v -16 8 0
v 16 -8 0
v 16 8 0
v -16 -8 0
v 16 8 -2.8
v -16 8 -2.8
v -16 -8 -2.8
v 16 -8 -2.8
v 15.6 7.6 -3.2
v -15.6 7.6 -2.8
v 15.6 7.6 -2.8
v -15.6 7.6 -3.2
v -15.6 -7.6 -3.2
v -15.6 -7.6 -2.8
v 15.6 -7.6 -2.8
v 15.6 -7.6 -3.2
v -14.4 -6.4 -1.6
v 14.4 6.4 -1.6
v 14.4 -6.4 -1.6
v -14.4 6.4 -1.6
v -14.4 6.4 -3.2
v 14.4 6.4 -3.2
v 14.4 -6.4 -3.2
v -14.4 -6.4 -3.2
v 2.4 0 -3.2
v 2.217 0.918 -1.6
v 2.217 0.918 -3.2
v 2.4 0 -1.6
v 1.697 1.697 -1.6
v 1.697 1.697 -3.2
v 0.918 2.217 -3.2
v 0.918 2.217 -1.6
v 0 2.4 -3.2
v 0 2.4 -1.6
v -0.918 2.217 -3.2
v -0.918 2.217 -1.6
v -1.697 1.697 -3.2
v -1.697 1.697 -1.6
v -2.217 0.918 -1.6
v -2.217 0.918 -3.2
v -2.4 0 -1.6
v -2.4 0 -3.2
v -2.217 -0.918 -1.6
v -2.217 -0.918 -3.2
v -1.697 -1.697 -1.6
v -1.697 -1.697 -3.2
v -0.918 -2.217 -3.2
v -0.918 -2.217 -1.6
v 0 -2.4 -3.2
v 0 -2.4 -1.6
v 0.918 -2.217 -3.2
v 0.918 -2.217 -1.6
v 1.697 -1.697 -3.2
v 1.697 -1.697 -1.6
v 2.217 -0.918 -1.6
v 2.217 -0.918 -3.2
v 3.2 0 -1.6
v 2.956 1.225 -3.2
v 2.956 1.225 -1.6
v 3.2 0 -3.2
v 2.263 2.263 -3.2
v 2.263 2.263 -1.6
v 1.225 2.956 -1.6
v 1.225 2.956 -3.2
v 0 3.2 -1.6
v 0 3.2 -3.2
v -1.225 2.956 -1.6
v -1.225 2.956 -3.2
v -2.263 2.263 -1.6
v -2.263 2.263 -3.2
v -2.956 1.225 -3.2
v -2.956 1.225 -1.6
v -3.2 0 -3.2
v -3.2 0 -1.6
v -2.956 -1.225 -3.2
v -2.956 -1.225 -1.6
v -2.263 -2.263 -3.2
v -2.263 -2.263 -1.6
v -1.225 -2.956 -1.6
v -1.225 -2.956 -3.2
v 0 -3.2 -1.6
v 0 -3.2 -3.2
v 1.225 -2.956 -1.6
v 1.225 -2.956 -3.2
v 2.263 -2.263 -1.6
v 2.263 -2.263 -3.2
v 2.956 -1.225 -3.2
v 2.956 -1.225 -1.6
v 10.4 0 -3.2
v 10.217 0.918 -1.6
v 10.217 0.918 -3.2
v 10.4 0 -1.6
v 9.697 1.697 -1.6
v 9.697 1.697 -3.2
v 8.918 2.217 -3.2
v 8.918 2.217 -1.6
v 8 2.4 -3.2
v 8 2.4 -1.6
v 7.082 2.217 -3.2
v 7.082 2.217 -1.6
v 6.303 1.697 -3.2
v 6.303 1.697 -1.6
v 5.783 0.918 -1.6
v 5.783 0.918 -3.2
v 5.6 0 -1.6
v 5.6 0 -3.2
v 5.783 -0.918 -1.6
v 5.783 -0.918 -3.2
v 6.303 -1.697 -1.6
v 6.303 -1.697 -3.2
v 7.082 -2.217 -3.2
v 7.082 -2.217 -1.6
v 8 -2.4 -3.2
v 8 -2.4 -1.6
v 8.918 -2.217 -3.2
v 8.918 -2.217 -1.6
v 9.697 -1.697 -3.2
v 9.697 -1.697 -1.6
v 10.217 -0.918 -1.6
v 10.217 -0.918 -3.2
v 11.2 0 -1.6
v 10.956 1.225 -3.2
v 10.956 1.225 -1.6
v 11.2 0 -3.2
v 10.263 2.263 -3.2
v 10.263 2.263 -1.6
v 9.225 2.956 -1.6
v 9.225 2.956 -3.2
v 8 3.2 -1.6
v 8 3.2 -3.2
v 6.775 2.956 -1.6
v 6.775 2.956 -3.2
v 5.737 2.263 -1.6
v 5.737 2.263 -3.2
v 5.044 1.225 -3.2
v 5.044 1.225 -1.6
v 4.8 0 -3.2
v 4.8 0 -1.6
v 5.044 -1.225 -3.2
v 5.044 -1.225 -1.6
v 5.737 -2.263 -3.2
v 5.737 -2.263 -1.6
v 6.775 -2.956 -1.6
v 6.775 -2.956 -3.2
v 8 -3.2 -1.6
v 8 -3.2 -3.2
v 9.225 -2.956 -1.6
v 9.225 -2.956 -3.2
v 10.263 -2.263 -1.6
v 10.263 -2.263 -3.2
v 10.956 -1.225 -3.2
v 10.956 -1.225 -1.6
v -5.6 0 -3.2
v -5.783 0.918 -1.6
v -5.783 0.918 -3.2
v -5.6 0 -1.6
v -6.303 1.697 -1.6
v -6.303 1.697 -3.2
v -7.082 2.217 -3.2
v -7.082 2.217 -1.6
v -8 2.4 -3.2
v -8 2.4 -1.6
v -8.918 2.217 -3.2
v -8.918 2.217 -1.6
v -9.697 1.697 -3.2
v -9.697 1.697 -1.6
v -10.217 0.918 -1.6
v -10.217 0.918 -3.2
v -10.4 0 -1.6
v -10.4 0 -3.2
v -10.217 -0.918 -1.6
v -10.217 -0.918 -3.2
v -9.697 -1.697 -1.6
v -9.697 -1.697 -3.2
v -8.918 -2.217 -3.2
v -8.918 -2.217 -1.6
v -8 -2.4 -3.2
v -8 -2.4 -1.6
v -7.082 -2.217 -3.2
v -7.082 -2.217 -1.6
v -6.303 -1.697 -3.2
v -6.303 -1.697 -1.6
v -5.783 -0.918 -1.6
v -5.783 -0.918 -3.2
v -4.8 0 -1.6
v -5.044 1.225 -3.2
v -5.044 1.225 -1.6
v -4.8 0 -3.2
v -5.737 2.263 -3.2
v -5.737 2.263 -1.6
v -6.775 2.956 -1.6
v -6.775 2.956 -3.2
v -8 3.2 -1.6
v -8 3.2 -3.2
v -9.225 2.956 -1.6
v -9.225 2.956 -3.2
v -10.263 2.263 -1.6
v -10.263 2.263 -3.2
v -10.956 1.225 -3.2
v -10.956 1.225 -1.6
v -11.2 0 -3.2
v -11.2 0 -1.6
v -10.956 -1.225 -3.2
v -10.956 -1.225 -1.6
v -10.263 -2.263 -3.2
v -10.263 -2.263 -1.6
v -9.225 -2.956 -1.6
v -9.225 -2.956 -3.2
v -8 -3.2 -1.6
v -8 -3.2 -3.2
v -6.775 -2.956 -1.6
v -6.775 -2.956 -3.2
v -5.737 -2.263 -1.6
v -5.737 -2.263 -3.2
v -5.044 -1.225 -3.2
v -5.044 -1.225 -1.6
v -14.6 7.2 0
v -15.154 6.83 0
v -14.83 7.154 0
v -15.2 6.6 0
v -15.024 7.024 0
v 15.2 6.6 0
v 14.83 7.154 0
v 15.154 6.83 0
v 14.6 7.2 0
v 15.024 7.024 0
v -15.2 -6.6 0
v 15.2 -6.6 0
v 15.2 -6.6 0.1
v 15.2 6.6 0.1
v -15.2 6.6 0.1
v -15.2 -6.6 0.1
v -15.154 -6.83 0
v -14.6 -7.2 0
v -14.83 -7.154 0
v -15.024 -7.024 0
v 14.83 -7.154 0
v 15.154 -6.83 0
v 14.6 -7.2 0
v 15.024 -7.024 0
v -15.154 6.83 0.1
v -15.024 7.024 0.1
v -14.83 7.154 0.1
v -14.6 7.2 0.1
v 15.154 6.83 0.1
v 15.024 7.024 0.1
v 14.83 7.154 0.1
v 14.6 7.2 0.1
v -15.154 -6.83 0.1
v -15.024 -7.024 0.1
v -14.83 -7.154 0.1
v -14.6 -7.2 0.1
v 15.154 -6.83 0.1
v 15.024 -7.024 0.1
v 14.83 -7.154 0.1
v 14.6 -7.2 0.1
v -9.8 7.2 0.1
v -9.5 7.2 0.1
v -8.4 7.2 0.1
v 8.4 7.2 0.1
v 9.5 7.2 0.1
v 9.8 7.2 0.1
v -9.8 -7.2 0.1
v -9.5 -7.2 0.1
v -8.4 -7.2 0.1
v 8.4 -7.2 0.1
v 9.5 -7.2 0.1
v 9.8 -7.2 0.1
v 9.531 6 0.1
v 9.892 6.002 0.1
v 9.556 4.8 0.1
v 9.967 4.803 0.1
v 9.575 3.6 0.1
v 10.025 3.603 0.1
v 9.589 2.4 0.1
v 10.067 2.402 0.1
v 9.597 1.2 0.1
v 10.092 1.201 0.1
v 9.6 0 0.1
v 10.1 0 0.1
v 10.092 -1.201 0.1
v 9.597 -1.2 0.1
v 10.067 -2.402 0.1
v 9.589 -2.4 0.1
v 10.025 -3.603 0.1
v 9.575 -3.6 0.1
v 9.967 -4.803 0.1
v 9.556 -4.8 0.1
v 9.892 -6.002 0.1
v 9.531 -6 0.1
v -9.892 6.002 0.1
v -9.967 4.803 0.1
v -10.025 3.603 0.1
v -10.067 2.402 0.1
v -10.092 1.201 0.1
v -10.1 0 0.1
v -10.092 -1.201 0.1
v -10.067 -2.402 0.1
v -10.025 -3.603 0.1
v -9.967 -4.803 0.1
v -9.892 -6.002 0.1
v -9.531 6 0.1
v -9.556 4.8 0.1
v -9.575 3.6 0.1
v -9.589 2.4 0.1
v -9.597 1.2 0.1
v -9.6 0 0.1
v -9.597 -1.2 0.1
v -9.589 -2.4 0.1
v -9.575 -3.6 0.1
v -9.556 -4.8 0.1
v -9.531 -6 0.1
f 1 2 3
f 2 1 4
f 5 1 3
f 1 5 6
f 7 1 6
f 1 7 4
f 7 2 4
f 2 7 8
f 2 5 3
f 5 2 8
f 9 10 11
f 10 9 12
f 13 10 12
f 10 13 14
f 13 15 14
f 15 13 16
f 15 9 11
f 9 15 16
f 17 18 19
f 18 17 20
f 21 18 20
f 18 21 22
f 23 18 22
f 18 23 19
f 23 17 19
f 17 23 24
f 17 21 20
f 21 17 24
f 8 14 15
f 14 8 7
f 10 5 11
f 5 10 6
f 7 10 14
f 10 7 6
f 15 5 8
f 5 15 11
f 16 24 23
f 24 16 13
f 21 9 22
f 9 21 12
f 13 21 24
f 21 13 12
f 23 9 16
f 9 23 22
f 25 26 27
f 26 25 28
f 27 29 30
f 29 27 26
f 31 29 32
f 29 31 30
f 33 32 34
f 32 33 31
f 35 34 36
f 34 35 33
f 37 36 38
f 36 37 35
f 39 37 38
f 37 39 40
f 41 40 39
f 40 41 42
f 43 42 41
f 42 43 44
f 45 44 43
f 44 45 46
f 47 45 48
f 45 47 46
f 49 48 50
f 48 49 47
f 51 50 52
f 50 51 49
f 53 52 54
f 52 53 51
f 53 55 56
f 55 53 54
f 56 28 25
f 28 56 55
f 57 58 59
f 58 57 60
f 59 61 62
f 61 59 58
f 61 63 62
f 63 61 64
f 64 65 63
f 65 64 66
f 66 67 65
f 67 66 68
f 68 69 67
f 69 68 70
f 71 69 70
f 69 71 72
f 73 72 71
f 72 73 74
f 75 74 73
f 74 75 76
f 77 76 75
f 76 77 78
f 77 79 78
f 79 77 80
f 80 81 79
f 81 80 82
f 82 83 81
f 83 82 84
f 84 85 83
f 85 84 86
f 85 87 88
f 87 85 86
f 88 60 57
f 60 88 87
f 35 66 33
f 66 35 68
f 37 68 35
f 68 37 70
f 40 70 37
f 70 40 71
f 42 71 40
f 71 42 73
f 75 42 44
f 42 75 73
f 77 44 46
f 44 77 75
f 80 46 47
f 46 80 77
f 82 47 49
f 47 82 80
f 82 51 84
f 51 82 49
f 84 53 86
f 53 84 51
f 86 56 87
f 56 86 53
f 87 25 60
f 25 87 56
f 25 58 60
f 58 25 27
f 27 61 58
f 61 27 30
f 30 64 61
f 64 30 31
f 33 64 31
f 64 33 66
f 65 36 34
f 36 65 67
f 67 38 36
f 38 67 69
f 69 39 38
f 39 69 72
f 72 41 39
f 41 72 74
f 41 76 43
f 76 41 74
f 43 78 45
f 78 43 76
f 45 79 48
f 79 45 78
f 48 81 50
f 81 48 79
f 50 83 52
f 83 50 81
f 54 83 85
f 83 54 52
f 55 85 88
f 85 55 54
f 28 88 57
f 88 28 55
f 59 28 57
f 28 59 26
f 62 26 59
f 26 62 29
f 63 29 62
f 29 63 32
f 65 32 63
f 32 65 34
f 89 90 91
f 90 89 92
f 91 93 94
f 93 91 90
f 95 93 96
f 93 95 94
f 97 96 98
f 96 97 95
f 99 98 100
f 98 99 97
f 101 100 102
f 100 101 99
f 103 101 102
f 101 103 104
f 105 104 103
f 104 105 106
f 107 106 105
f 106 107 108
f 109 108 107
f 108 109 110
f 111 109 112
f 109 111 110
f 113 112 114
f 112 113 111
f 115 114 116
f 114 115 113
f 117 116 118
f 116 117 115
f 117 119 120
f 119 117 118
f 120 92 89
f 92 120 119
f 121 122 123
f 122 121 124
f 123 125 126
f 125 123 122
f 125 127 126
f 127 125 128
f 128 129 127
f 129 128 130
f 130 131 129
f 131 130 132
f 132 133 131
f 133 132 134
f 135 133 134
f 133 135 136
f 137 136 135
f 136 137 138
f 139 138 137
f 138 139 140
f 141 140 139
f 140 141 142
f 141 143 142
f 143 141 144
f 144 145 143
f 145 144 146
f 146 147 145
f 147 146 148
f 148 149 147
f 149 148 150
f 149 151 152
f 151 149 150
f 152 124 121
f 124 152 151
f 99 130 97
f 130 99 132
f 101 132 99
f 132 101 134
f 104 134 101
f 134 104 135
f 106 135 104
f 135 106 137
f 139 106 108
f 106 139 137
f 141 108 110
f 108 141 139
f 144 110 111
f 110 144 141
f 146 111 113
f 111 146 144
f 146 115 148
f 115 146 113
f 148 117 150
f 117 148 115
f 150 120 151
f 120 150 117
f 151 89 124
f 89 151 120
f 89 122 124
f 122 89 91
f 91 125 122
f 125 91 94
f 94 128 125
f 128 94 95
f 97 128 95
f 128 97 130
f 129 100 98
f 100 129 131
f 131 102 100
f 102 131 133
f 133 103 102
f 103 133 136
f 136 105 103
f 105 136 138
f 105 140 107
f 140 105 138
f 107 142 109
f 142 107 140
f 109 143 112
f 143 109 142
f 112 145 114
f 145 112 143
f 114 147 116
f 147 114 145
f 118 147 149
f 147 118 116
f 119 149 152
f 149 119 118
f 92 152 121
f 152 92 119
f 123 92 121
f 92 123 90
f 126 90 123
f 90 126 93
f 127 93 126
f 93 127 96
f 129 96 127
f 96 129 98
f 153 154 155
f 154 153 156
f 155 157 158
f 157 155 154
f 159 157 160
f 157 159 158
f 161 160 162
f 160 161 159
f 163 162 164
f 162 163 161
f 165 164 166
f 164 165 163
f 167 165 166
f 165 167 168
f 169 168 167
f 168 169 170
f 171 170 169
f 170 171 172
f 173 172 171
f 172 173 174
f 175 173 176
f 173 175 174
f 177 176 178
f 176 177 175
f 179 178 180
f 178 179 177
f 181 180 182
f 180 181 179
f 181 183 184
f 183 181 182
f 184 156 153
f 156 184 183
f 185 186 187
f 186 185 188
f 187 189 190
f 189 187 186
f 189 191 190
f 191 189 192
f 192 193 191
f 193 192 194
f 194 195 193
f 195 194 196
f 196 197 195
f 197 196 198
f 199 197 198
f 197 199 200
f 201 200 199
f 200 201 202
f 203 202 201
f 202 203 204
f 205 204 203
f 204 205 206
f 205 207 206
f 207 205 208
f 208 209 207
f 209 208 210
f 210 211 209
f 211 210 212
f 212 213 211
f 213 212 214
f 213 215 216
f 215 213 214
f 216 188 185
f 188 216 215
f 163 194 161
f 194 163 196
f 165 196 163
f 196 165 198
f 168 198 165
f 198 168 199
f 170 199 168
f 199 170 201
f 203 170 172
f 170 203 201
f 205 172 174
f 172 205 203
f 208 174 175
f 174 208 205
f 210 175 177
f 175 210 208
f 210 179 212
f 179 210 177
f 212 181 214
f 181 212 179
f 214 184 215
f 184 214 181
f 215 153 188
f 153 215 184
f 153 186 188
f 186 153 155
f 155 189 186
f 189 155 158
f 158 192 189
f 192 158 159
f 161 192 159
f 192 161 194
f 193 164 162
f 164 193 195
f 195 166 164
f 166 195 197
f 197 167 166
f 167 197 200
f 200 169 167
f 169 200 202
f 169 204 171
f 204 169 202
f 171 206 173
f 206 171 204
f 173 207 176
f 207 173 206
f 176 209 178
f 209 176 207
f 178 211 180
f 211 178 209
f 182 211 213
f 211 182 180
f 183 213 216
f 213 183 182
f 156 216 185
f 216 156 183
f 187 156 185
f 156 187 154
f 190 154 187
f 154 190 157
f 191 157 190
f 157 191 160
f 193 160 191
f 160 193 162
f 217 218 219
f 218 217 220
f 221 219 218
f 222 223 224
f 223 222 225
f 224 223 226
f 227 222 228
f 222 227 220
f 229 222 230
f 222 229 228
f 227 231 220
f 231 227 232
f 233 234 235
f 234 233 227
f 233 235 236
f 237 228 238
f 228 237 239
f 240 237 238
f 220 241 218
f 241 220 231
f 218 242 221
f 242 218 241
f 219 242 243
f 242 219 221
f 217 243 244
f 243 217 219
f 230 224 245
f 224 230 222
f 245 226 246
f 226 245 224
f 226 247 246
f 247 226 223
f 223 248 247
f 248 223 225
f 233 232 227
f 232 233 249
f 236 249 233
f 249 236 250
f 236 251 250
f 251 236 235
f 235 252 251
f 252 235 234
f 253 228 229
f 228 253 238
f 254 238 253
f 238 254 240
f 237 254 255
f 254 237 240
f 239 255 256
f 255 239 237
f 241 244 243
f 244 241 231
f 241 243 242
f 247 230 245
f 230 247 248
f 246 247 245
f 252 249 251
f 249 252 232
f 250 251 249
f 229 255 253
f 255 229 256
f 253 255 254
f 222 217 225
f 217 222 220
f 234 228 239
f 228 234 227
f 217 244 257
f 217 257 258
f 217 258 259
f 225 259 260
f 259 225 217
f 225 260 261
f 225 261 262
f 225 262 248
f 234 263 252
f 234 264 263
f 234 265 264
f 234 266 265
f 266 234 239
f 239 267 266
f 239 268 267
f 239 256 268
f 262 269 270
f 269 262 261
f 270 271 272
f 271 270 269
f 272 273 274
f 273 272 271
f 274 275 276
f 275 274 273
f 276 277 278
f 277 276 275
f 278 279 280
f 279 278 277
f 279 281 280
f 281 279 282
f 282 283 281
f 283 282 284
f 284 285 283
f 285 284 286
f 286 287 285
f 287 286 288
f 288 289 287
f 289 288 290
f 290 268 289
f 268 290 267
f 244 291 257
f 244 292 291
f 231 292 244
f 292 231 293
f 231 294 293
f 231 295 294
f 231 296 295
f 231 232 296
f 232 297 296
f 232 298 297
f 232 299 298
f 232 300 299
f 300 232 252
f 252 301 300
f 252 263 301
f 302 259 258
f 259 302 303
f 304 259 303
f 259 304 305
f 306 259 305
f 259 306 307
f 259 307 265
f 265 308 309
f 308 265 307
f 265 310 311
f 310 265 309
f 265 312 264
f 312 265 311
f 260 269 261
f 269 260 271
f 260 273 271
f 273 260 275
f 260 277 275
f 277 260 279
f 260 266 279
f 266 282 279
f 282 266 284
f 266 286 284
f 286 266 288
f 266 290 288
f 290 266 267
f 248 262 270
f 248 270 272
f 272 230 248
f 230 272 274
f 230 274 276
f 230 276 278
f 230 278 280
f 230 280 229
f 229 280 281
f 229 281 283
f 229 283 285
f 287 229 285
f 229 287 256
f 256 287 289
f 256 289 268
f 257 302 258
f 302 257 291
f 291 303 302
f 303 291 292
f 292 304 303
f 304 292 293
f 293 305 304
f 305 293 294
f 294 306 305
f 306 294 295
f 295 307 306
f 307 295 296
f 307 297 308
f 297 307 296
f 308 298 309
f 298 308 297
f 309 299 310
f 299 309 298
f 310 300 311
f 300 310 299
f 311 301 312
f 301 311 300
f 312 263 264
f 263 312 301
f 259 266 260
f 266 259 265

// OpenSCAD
// file: ../p/4-4ring3.scad
use <../lib.scad>
$fa=1; $fs=0.2;
function ldraw_lib__4_4ring3(realsolid=false) = [
// 0 Ring  3 x 1.0
// 0 Name: 4-4ring3.dat
// 0 Author: James Jessiman
// 0 !LDRAW_ORG Primitive UPDATE 2009-01
// 0 !LICENSE Licensed under CC BY 2.0 and CC BY 4.0 : see CAreadme.txt
// 
// 0 BFC CERTIFY CCW
  [0,"BFC","CERTIFY"],
  [0,"BFC","CCW"],
// 
// 0 !HISTORY 1998-12-15 [PTadmin] Official Update 1998-10
// 0 !HISTORY 2002-04-05 [hafhead] Added BFC statement
// 0 !HISTORY 2002-04-25 [PTadmin] Official Update 2002-02
// 0 !HISTORY 2007-06-24 [PTadmin] Header formatted for Contributor Agreement
// 0 !HISTORY 2008-07-01 [PTadmin] Official Update 2008-01
// 0 !HISTORY 2008-08-26 [cwdee] Switch polygon winding and rename
// 0 !HISTORY 2009-05-02 [PTadmin] Official Update 2009-01
// 
// 
// 4 16 -1.5308 0 3.6956 -1.1481 0 2.7717 0 0 3 0 0 4
  [4,16,-1.5308,0,3.6956,-1.1481,0,2.7717,0,0,3,0,0,4],
// 4 16 -2.8284 0 2.8284 -2.1213 0 2.1213 -1.1481 0 2.7717 -1.5308 0 3.6956
  [4,16,-2.8284,0,2.8284,-2.1213,0,2.1213,-1.1481,0,2.7717,-1.5308,0,3.6956],
// 4 16 -3.6956 0 1.5308 -2.7717 0 1.1481 -2.1213 0 2.1213 -2.8284 0 2.8284
  [4,16,-3.6956,0,1.5308,-2.7717,0,1.1481,-2.1213,0,2.1213,-2.8284,0,2.8284],
// 4 16 -4 0 0 -3 0 0 -2.7717 0 1.1481 -3.6956 0 1.5308
  [4,16,-4,0,0,-3,0,0,-2.7717,0,1.1481,-3.6956,0,1.5308],
// 4 16 -3.6956 0 -1.5308 -2.7717 0 -1.1481 -3 0 0 -4 0 0
  [4,16,-3.6956,0,-1.5308,-2.7717,0,-1.1481,-3,0,0,-4,0,0],
// 4 16 -2.8284 0 -2.8284 -2.1213 0 -2.1213 -2.7717 0 -1.1481 -3.6956 0 -1.5308
  [4,16,-2.8284,0,-2.8284,-2.1213,0,-2.1213,-2.7717,0,-1.1481,-3.6956,0,-1.5308],
// 4 16 -1.5308 0 -3.6956 -1.1481 0 -2.7717 -2.1213 0 -2.1213 -2.8284 0 -2.8284
  [4,16,-1.5308,0,-3.6956,-1.1481,0,-2.7717,-2.1213,0,-2.1213,-2.8284,0,-2.8284],
// 4 16 0 0 -4 0 0 -3 -1.1481 0 -2.7717 -1.5308 0 -3.6956
  [4,16,0,0,-4,0,0,-3,-1.1481,0,-2.7717,-1.5308,0,-3.6956],
// 4 16 1.5308 0 -3.6956 1.1481 0 -2.7717 0 0 -3 0 0 -4
  [4,16,1.5308,0,-3.6956,1.1481,0,-2.7717,0,0,-3,0,0,-4],
// 4 16 2.8284 0 -2.8284 2.1213 0 -2.1213 1.1481 0 -2.7717 1.5308 0 -3.6956
  [4,16,2.8284,0,-2.8284,2.1213,0,-2.1213,1.1481,0,-2.7717,1.5308,0,-3.6956],
// 4 16 3.6956 0 -1.5308 2.7717 0 -1.1481 2.1213 0 -2.1213 2.8284 0 -2.8284
  [4,16,3.6956,0,-1.5308,2.7717,0,-1.1481,2.1213,0,-2.1213,2.8284,0,-2.8284],
// 4 16 4 0 0 3 0 0 2.7717 0 -1.1481 3.6956 0 -1.5308
  [4,16,4,0,0,3,0,0,2.7717,0,-1.1481,3.6956,0,-1.5308],
// 4 16 3.6956 0 1.5308 2.7717 0 1.1481 3 0 0 4 0 0
  [4,16,3.6956,0,1.5308,2.7717,0,1.1481,3,0,0,4,0,0],
// 4 16 2.8284 0 2.8284 2.1213 0 2.1213 2.7717 0 1.1481 3.6956 0 1.5308
  [4,16,2.8284,0,2.8284,2.1213,0,2.1213,2.7717,0,1.1481,3.6956,0,1.5308],
// 4 16 1.5308 0 3.6956 1.1481 0 2.7717 2.1213 0 2.1213 2.8284 0 2.8284
  [4,16,1.5308,0,3.6956,1.1481,0,2.7717,2.1213,0,2.1213,2.8284,0,2.8284],
// 4 16 0 0 4 0 0 3 1.1481 0 2.7717 1.5308 0 3.6956
  [4,16,0,0,4,0,0,3,1.1481,0,2.7717,1.5308,0,3.6956],
// 0
];
module ldraw_lib__4_4ring3(step=0, col=false, unit=2/5, alt=false, line=0.2, solid=!$preview)
    makepoly(ldraw_lib__4_4ring3(solid), step=step, col=col, unit=unit, alt=alt, line=line, solid=solid);
ldraw_lib__4_4ring3(line=0.2);
// file: ../p/4-4edge.scad
use <../lib.scad>
function ldraw_lib__4_4edge() = [
// 0 Circle 1.0
// 0 Name: 4-4edge.dat
// 0 Author: James Jessiman
// 0 !LDRAW_ORG Primitive UPDATE 2017-01
// 0 !LICENSE Licensed under CC BY 2.0 and CC BY 4.0 : see CAreadme.txt
// 
// 0 BFC CERTIFY CCW
  [0,"BFC","CERTIFY"],
  [0,"BFC","CCW"],
// 
// 0 !HISTORY 1998-12-15 [PTadmin] Official Update 1998-10
// 0 !HISTORY 2005-12-28 [PTadmin] Official Update 2005-01
// 0 !HISTORY 2007-06-24 [PTadmin] Header formatted for Contributor Agreement
// 0 !HISTORY 2008-07-01 [PTadmin] Official Update 2008-01
// 0 !HISTORY 2017-01-15 [Steffen] BFCed
// 0 !HISTORY 2017-12-30 [PTadmin] Official Update 2017-01
// 
// 
// 2 24 1 0 0 0.9239 0 0.3827
  [2,24,1,0,0,0.9239,0,0.3827],
// 2 24 0.9239 0 0.3827 0.7071 0 0.7071
  [2,24,0.9239,0,0.3827,0.7071,0,0.7071],
// 2 24 0.7071 0 0.7071 0.3827 0 0.9239
  [2,24,0.7071,0,0.7071,0.3827,0,0.9239],
// 2 24 0.3827 0 0.9239 0 0 1
  [2,24,0.3827,0,0.9239,0,0,1],
// 2 24 0 0 1 -0.3827 0 0.9239
  [2,24,0,0,1,-0.3827,0,0.9239],
// 2 24 -0.3827 0 0.9239 -0.7071 0 0.7071
  [2,24,-0.3827,0,0.9239,-0.7071,0,0.7071],
// 2 24 -0.7071 0 0.7071 -0.9239 0 0.3827
  [2,24,-0.7071,0,0.7071,-0.9239,0,0.3827],
// 2 24 -0.9239 0 0.3827 -1 0 -0
  [2,24,-0.9239,0,0.3827,-1,0,-0],
// 2 24 -1 0 -0 -0.9239 0 -0.3827
  [2,24,-1,0,-0,-0.9239,0,-0.3827],
// 2 24 -0.9239 0 -0.3827 -0.7071 0 -0.7071
  [2,24,-0.9239,0,-0.3827,-0.7071,0,-0.7071],
// 2 24 -0.7071 0 -0.7071 -0.3827 0 -0.9239
  [2,24,-0.7071,0,-0.7071,-0.3827,0,-0.9239],
// 2 24 -0.3827 0 -0.9239 0 0 -1
  [2,24,-0.3827,0,-0.9239,0,0,-1],
// 2 24 0 0 -1 0.3827 0 -0.9239
  [2,24,0,0,-1,0.3827,0,-0.9239],
// 2 24 0.3827 0 -0.9239 0.7071 0 -0.7071
  [2,24,0.3827,0,-0.9239,0.7071,0,-0.7071],
// 2 24 0.7071 0 -0.7071 0.9239 0 -0.3827
  [2,24,0.7071,0,-0.7071,0.9239,0,-0.3827],
// 2 24 0.9239 0 -0.3827 1 0 0
  [2,24,0.9239,0,-0.3827,1,0,0],
];
module ldraw_lib__4_4edge(step=0, col=false, unit=2/5, alt=false, line=0.2, solid=!$preview)
    makepoly(ldraw_lib__4_4edge(), step=step, col=col, unit=unit, alt=alt, line=line, solid=solid);
ldraw_lib__4_4edge(line=0.2);
// file: ../p/4-4cyli.scad
use <../lib.scad>
$fa=1; $fs=0.2;
function ldraw_lib__4_4cyli(realsolid=false) = [
// 0 Cylinder 1.0
// 0 Name: 4-4cyli.dat
// 0 Author: James Jessiman
// 0 !LDRAW_ORG Primitive UPDATE 2005-01
// 0 !LICENSE Licensed under CC BY 2.0 and CC BY 4.0 : see CAreadme.txt
// 
// 0 BFC CERTIFY CCW
  [0,"BFC","CERTIFY"],
  [0,"BFC","CCW"],
// 
// 0 !HISTORY 1998-12-15 [PTadmin] Official Update 1998-10
// 0 !HISTORY 2002-03-23 [sbliss] Added BFC statement; merged headers from files in distributions LDraw 0.27 and Complete.
// 0 !HISTORY 2002-04-25 [PTadmin] Official Update 2002-02
// 0 !HISTORY 2004-12-14 [guyvivan] BFC CCW
// 0 !HISTORY 2005-12-28 [PTadmin] Official Update 2005-01
// 0 !HISTORY 2007-06-24 [PTadmin] Header formatted for Contributor Agreement
// 0 !HISTORY 2008-07-01 [PTadmin] Official Update 2008-01
// 
// 
// 4 16 1 1 0 0.9239 1 0.3827 0.9239 0 0.3827 1 0 0
  [4,16,1,1,0,0.9239,1,0.3827,0.9239,0,0.3827,1,0,0],
// 5 24 1 0 0 1 1 0 0.9239 0 0.3827 0.9239 0 -0.3827
  [5,24,1,0,0,1,1,0,0.9239,0,0.3827,0.9239,0,-0.3827],
// 4 16 0.9239 1 0.3827 0.7071 1 0.7071 0.7071 0 0.7071 0.9239 0 0.3827
  [4,16,0.9239,1,0.3827,0.7071,1,0.7071,0.7071,0,0.7071,0.9239,0,0.3827],
// 5 24 0.9239 0 0.3827 0.9239 1 0.3827 0.7071 0 0.7071 1 0 0
  [5,24,0.9239,0,0.3827,0.9239,1,0.3827,0.7071,0,0.7071,1,0,0],
// 4 16 0.7071 1 0.7071 0.3827 1 0.9239 0.3827 0 0.9239 0.7071 0 0.7071
  [4,16,0.7071,1,0.7071,0.3827,1,0.9239,0.3827,0,0.9239,0.7071,0,0.7071],
// 5 24 0.7071 0 0.7071 0.7071 1 0.7071 0.3827 0 0.9239 0.9239 0 0.3827
  [5,24,0.7071,0,0.7071,0.7071,1,0.7071,0.3827,0,0.9239,0.9239,0,0.3827],
// 4 16 0.3827 1 0.9239 0 1 1 0 0 1 0.3827 0 0.9239
  [4,16,0.3827,1,0.9239,0,1,1,0,0,1,0.3827,0,0.9239],
// 5 24 0.3827 0 0.9239 0.3827 1 0.9239 0 0 1 0.7071 0 0.7071
  [5,24,0.3827,0,0.9239,0.3827,1,0.9239,0,0,1,0.7071,0,0.7071],
// 4 16 0 1 1 -0.3827 1 0.9239 -0.3827 0 0.9239 0 0 1
  [4,16,0,1,1,-0.3827,1,0.9239,-0.3827,0,0.9239,0,0,1],
// 5 24 0 0 1 0 1 1 -0.3827 0 0.9239 0.3827 0 0.9239
  [5,24,0,0,1,0,1,1,-0.3827,0,0.9239,0.3827,0,0.9239],
// 4 16 -0.3827 1 0.9239 -0.7071 1 0.7071 -0.7071 0 0.7071 -0.3827 0 0.9239
  [4,16,-0.3827,1,0.9239,-0.7071,1,0.7071,-0.7071,0,0.7071,-0.3827,0,0.9239],
// 5 24 -0.3827 0 0.9239 -0.3827 1 0.9239 -0.7071 0 0.7071 0 0 1
  [5,24,-0.3827,0,0.9239,-0.3827,1,0.9239,-0.7071,0,0.7071,0,0,1],
// 4 16 -0.7071 1 0.7071 -0.9239 1 0.3827 -0.9239 0 0.3827 -0.7071 0 0.7071
  [4,16,-0.7071,1,0.7071,-0.9239,1,0.3827,-0.9239,0,0.3827,-0.7071,0,0.7071],
// 5 24 -0.7071 0 0.7071 -0.7071 1 0.7071 -0.9239 0 0.3827 -0.3827 0 0.9239
  [5,24,-0.7071,0,0.7071,-0.7071,1,0.7071,-0.9239,0,0.3827,-0.3827,0,0.9239],
// 4 16 -0.9239 1 0.3827 -1 1 0 -1 0 0 -0.9239 0 0.3827
  [4,16,-0.9239,1,0.3827,-1,1,0,-1,0,0,-0.9239,0,0.3827],
// 5 24 -0.9239 0 0.3827 -0.9239 1 0.3827 -1 0 0 -0.7071 0 0.7071
  [5,24,-0.9239,0,0.3827,-0.9239,1,0.3827,-1,0,0,-0.7071,0,0.7071],
// 4 16 -1 1 0 -0.9239 1 -0.3827 -0.9239 0 -0.3827 -1 0 0
  [4,16,-1,1,0,-0.9239,1,-0.3827,-0.9239,0,-0.3827,-1,0,0],
// 5 24 -1 0 0 -1 1 0 -0.9239 0 -0.3827 -0.9239 0 0.3827
  [5,24,-1,0,0,-1,1,0,-0.9239,0,-0.3827,-0.9239,0,0.3827],
// 4 16 -0.9239 1 -0.3827 -0.7071 1 -0.7071 -0.7071 0 -0.7071 -0.9239 0 -0.3827
  [4,16,-0.9239,1,-0.3827,-0.7071,1,-0.7071,-0.7071,0,-0.7071,-0.9239,0,-0.3827],
// 5 24 -0.9239 0 -0.3827 -0.9239 1 -0.3827 -0.7071 0 -0.7071 -1 0 0
  [5,24,-0.9239,0,-0.3827,-0.9239,1,-0.3827,-0.7071,0,-0.7071,-1,0,0],
// 4 16 -0.7071 1 -0.7071 -0.3827 1 -0.9239 -0.3827 0 -0.9239 -0.7071 0 -0.7071
  [4,16,-0.7071,1,-0.7071,-0.3827,1,-0.9239,-0.3827,0,-0.9239,-0.7071,0,-0.7071],
// 5 24 -0.7071 0 -0.7071 -0.7071 1 -0.7071 -0.3827 0 -0.9239 -0.9239 0 -0.3827
  [5,24,-0.7071,0,-0.7071,-0.7071,1,-0.7071,-0.3827,0,-0.9239,-0.9239,0,-0.3827],
// 4 16 -0.3827 1 -0.9239 0 1 -1 0 0 -1 -0.3827 0 -0.9239
  [4,16,-0.3827,1,-0.9239,0,1,-1,0,0,-1,-0.3827,0,-0.9239],
// 5 24 -0.3827 0 -0.9239 -0.3827 1 -0.9239 0 0 -1 -0.7071 0 -0.7071
  [5,24,-0.3827,0,-0.9239,-0.3827,1,-0.9239,0,0,-1,-0.7071,0,-0.7071],
// 4 16 0 1 -1 0.3827 1 -0.9239 0.3827 0 -0.9239 0 0 -1
  [4,16,0,1,-1,0.3827,1,-0.9239,0.3827,0,-0.9239,0,0,-1],
// 5 24 0 0 -1 0 1 -1 0.3827 0 -0.9239 -0.3827 0 -0.9239
  [5,24,0,0,-1,0,1,-1,0.3827,0,-0.9239,-0.3827,0,-0.9239],
// 4 16 0.3827 1 -0.9239 0.7071 1 -0.7071 0.7071 0 -0.7071 0.3827 0 -0.9239
  [4,16,0.3827,1,-0.9239,0.7071,1,-0.7071,0.7071,0,-0.7071,0.3827,0,-0.9239],
// 5 24 0.3827 0 -0.9239 0.3827 1 -0.9239 0.7071 0 -0.7071 0 0 -1
  [5,24,0.3827,0,-0.9239,0.3827,1,-0.9239,0.7071,0,-0.7071,0,0,-1],
// 4 16 0.7071 1 -0.7071 0.9239 1 -0.3827 0.9239 0 -0.3827 0.7071 0 -0.7071
  [4,16,0.7071,1,-0.7071,0.9239,1,-0.3827,0.9239,0,-0.3827,0.7071,0,-0.7071],
// 5 24 0.7071 0 -0.7071 0.7071 1 -0.7071 0.9239 0 -0.3827 0.3827 0 -0.9239
  [5,24,0.7071,0,-0.7071,0.7071,1,-0.7071,0.9239,0,-0.3827,0.3827,0,-0.9239],
// 4 16 0.9239 1 -0.3827 1 1 0 1 0 0 0.9239 0 -0.3827
  [4,16,0.9239,1,-0.3827,1,1,0,1,0,0,0.9239,0,-0.3827],
// 5 24 0.9239 0 -0.3827 0.9239 1 -0.3827 1 0 0 0.7071 0 -0.7071
  [5,24,0.9239,0,-0.3827,0.9239,1,-0.3827,1,0,0,0.7071,0,-0.7071],
// 0
];
module ldraw_lib__4_4cyli(step=0, col=false, unit=2/5, alt=false, line=0.2, solid=!$preview)
    makepoly(ldraw_lib__4_4cyli(solid), step=step, col=col, unit=unit, alt=alt, line=line, solid=solid);
ldraw_lib__4_4cyli(line=0.2);
// file: ../p/stud4.scad
use <../lib.scad>
use <4-4cyli.scad>
use <4-4edge.scad>
use <4-4ring3.scad>
function ldraw_lib__stud4() = [
// 0 Stud Tube Open
// 0 Name: stud4.dat
// 0 Author: James Jessiman
// 0 !LDRAW_ORG Primitive UPDATE 2009-02
// 0 !LICENSE Licensed under CC BY 4.0 : see CAreadme.txt
// 
// 0 BFC CERTIFY CCW
  [0,"BFC","CERTIFY"],
  [0,"BFC","CCW"],
// 
// 0 !HISTORY 1999-07-05 [PTadmin] Official Update 1999-05
// 0 !HISTORY 2002-04-04 [sbliss] Modified for BFC compliance
// 0 !HISTORY 2002-04-25 [PTadmin] Official Update 2002-02
// 0 !HISTORY 2007-06-24 [PTadmin] Header formatted for Contributor Agreement
// 0 !HISTORY 2008-07-01 [PTadmin] Official Update 2008-01
// 0 !HISTORY 2009-06-21 [cwdee] Update ring references to 4-4ring
// 0 !HISTORY 2009-09-03 [PTadmin] Official Update 2009-02
// 
// 
// 1 16 0 -4 0 6 0 0 0 1 0 0 0 6 4-4edge.dat
  [1,16,0,-4,0,6,0,0,0,1,0,0,0,6, ldraw_lib__4_4edge()],
// 1 16 0 -4 0 8 0 0 0 1 0 0 0 8 4-4edge.dat
  [1,16,0,-4,0,8,0,0,0,1,0,0,0,8, ldraw_lib__4_4edge()],
// 1 16 0 0 0 6 0 0 0 1 0 0 0 6 4-4edge.dat
  [1,16,0,0,0,6,0,0,0,1,0,0,0,6, ldraw_lib__4_4edge()],
// 1 16 0 0 0 8 0 0 0 1 0 0 0 8 4-4edge.dat
  [1,16,0,0,0,8,0,0,0,1,0,0,0,8, ldraw_lib__4_4edge()],
// 0 BFC INVERTNEXT
  [0,"BFC","INVERTNEXT"],
// 1 16 0 -4 0 6 0 0 0 4 0 0 0 6 4-4cyli.dat
  [1,16,0,-4,0,6,0,0,0,4,0,0,0,6, ldraw_lib__4_4cyli()],
// 1 16 0 -4 0 8 0 0 0 4 0 0 0 8 4-4cyli.dat
  [1,16,0,-4,0,8,0,0,0,4,0,0,0,8, ldraw_lib__4_4cyli()],
// 1 16 0 -4 0 2 0 0 0 1 0 0 0 2 4-4ring3.dat
  [1,16,0,-4,0,2,0,0,0,1,0,0,0,2, ldraw_lib__4_4ring3()],
  [-1,16,0,0,0,2,0,0,0,-1,0,0,0,2, ldraw_lib__4_4ring3()],
// 0
];
module ldraw_lib__stud4(step=0, col=false, unit=2/5, alt=false, line=0.2, solid=!$preview)
    makepoly(ldraw_lib__stud4(), step=step, col=col, unit=unit, alt=alt, line=line, solid=solid);
ldraw_lib__stud4(line=0.2);
// file: ../p/box5.scad
use <../lib.scad>
function ldraw_lib__box5() = [
// 0 Box with 5 Faces and All Edges
// 0 Name: box5.dat
// 0 Author: James Jessiman
// 0 !LDRAW_ORG Primitive UPDATE 2012-01
// 0 !LICENSE Licensed under CC BY 2.0 and CC BY 4.0 : see CAreadme.txt
// 
// 0 BFC CERTIFY CCW
  [0,"BFC","CERTIFY"],
  [0,"BFC","CCW"],
// 
// 0 !HISTORY 2002-04-03 [sbliss] Modified for BFC compliance
// 0 !HISTORY 2002-04-25 [PTadmin] Official Update 2002-02
// 0 !HISTORY 2007-06-24 [PTadmin] Header formatted for Contributor Agreement
// 0 !HISTORY 2008-07-01 [PTadmin] Official Update 2008-01
// 0 !HISTORY 2012-02-16 [Philo] Changed to CCW
// 0 !HISTORY 2012-03-30 [PTadmin] Official Update 2012-01
// 
// 
// 2 24 1 1 1 -1 1 1
  [2,24,1,1,1,-1,1,1],
// 2 24 -1 1 1 -1 1 -1
  [2,24,-1,1,1,-1,1,-1],
// 2 24 -1 1 -1 1 1 -1
  [2,24,-1,1,-1,1,1,-1],
// 2 24 1 1 -1 1 1 1
  [2,24,1,1,-1,1,1,1],
// 2 24 1 0 1 -1 0 1
  [2,24,1,0,1,-1,0,1],
// 2 24 -1 0 1 -1 0 -1
  [2,24,-1,0,1,-1,0,-1],
// 2 24 -1 0 -1 1 0 -1
  [2,24,-1,0,-1,1,0,-1],
// 2 24 1 0 -1 1 0 1
  [2,24,1,0,-1,1,0,1],
// 2 24 1 0 1 1 1 1
  [2,24,1,0,1,1,1,1],
// 2 24 -1 0 1 -1 1 1
  [2,24,-1,0,1,-1,1,1],
// 2 24 1 0 -1 1 1 -1
  [2,24,1,0,-1,1,1,-1],
// 2 24 -1 0 -1 -1 1 -1
  [2,24,-1,0,-1,-1,1,-1],
// 4 16 -1 1 1 1 1 1 1 1 -1 -1 1 -1
  [4,16,-1,1,1,1,1,1,1,1,-1,-1,1,-1],
// 4 16 -1 1 1 -1 0 1 1 0 1 1 1 1
  [4,16,-1,1,1,-1,0,1,1,0,1,1,1,1],
// 4 16 -1 1 -1 -1 0 -1 -1 0 1 -1 1 1
  [4,16,-1,1,-1,-1,0,-1,-1,0,1,-1,1,1],
// 4 16 1 1 -1 1 0 -1 -1 0 -1 -1 1 -1
  [4,16,1,1,-1,1,0,-1,-1,0,-1,-1,1,-1],
// 4 16 1 1 1 1 0 1 1 0 -1 1 1 -1
  [4,16,1,1,1,1,0,1,1,0,-1,1,1,-1],
];
makepoly(ldraw_lib__box5(), line=0.2);
// file: ../p/box4.scad
use <../lib.scad>
function ldraw_lib__box4() = [
// 0 Box with 4 Faces (2 Parallel Pairs) and All Edges
// 0 Name: box4.dat
// 0 Author: James Jessiman
// 0 !LDRAW_ORG Primitive UPDATE 2012-01
// 0 !LICENSE Licensed under CC BY 4.0 : see CAreadme.txt
// 
// 0 BFC CERTIFY CCW
  [0,"BFC","CERTIFY"],
  [0,"BFC","CCW"],
// 
// 0 !HISTORY 2002-04-03 [sbliss] Modified for BFC compliance
// 0 !HISTORY 2002-04-25 [PTadmin] Official Update 2002-02
// 0 !HISTORY 2007-06-24 [PTadmin] Header formatted for Contributor Agreement
// 0 !HISTORY 2008-07-01 [PTadmin] Official Update 2008-01
// 0 !HISTORY 2012-02-16 [Philo] Changed to CCW
// 0 !HISTORY 2012-03-30 [PTadmin] Official Update 2012-01
// 
// 
// 2 24 1 1 1 -1 1 1
  [2,24,1,1,1,-1,1,1],
// 2 24 -1 1 1 -1 1 -1
  [2,24,-1,1,1,-1,1,-1],
// 2 24 -1 1 -1 1 1 -1
  [2,24,-1,1,-1,1,1,-1],
// 2 24 1 1 -1 1 1 1
  [2,24,1,1,-1,1,1,1],
// 2 24 1 0 1 -1 0 1
  [2,24,1,0,1,-1,0,1],
// 2 24 -1 0 1 -1 0 -1
  [2,24,-1,0,1,-1,0,-1],
// 2 24 -1 0 -1 1 0 -1
  [2,24,-1,0,-1,1,0,-1],
// 2 24 1 0 -1 1 0 1
  [2,24,1,0,-1,1,0,1],
// 2 24 1 0 1 1 1 1
  [2,24,1,0,1,1,1,1],
// 2 24 -1 0 1 -1 1 1
  [2,24,-1,0,1,-1,1,1],
// 2 24 1 0 -1 1 1 -1
  [2,24,1,0,-1,1,1,-1],
// 2 24 -1 0 -1 -1 1 -1
  [2,24,-1,0,-1,-1,1,-1],
// 4 16 -1 1 1 -1 0 1 1 0 1 1 1 1
  [4,16,-1,1,1,-1,0,1,1,0,1,1,1,1],
// 4 16 -1 1 -1 -1 0 -1 -1 0 1 -1 1 1
  [4,16,-1,1,-1,-1,0,-1,-1,0,1,-1,1,1],
// 4 16 1 1 -1 1 0 -1 -1 0 -1 -1 1 -1
  [4,16,1,1,-1,1,0,-1,-1,0,-1,-1,1,-1],
// 4 16 1 1 1 1 0 1 1 0 -1 1 1 -1
  [4,16,1,1,1,1,0,1,1,0,-1,1,1,-1],
];
module ldraw_lib__box4(step=0, col=false, unit=2/5, alt=false, line=0.2, solid=!$preview)
    makepoly(ldraw_lib__box4(), step=step, col=col, unit=unit, alt=alt, line=line, solid=solid);
ldraw_lib__box4(line=0.2);
// file: s/87079s01.scad
use <../../lib.scad>
use <../../p/box4.scad>
use <../../p/box5.scad>
use <../../p/stud4.scad>
function ldraw_lib__s__87079s01() = [
// 0 ~Tile  2 x  4 with Groove without Top
// 0 Name: s\87079s01.dat
// 0 Author: Philippe Hurbain [Philo]
// 0 !LDRAW_ORG Subpart UPDATE 2012-03
// 0 !LICENSE Licensed under CC BY 4.0 : see CAreadme.txt
// 
// 0 BFC CERTIFY CCW
  [0,"BFC","CERTIFY"],
  [0,"BFC","CCW"],
// 
// 0 !HISTORY 2012-09-30 [Philo] Subparted from Tim Gould's original design
// 0 !HISTORY 2012-12-28 [PTadmin] Official Update 2012-03
// 
// 
// 1 16 0 0 0 40 0 0 0 7 0 0 0 20 box4.dat
  [1,16,0,0,0,40,0,0,0,7,0,0,0,20, ldraw_lib__box4()],
// 1 16 0 7 0 39 0 0 0 1 0 0 0 19 box4.dat
  [1,16,0,7,0,39,0,0,0,1,0,0,0,19, ldraw_lib__box4()],
// 0 BFC INVERTNEXT
  [0,"BFC","INVERTNEXT"],
// 1 16 0 8 0 -36 0 0 0 -4 0 0 0 16 box5.dat
  [1,16,0,8,0,-36,0,0,0,-4,0,0,0,16, ldraw_lib__box5()],
// 4 16 -40 7 -20 -39 7 -19 39 7 -19 40 7 -20
  [4,16,-40,7,-20,-39,7,-19,39,7,-19,40,7,-20],
// 4 16 40 7 20 39 7 19 -39 7 19 -40 7 20
  [4,16,40,7,20,39,7,19,-39,7,19,-40,7,20],
// 4 16 -40 7 -20 -40 7 20 -39 7 19 -39 7 -19
  [4,16,-40,7,-20,-40,7,20,-39,7,19,-39,7,-19],
// 4 16 40 7 20 40 7 -20 39 7 -19 39 7 19
  [4,16,40,7,20,40,7,-20,39,7,-19,39,7,19],
// 4 16 -39 8 -19 -36 8 -16 36 8 -16 39 8 -19
  [4,16,-39,8,-19,-36,8,-16,36,8,-16,39,8,-19],
// 4 16 39 8 19 36 8 16 -36 8 16 -39 8 19
  [4,16,39,8,19,36,8,16,-36,8,16,-39,8,19],
// 4 16 -39 8 -19 -39 8 19 -36 8 16 -36 8 -16
  [4,16,-39,8,-19,-39,8,19,-36,8,16,-36,8,-16],
// 4 16 39 8 19 39 8 -19 36 8 -16 36 8 16
  [4,16,39,8,19,39,8,-19,36,8,-16,36,8,16],
// 1 16 0 4 0 1 0 0 0 -1 0 0 0 1 stud4.dat
  [1,16,0,4,0,1,0,0,0,-1,0,0,0,1, ldraw_lib__stud4()],
// 1 16 20 4 0 1 0 0 0 -1 0 0 0 1 stud4.dat
  [1,16,20,4,0,1,0,0,0,-1,0,0,0,1, ldraw_lib__stud4()],
// 1 16 -20 4 0 1 0 0 0 -1 0 0 0 1 stud4.dat
  [1,16,-20,4,0,1,0,0,0,-1,0,0,0,1, ldraw_lib__stud4()],
];
module ldraw_lib__s__87079s01(step=0, col=false, unit=2/5, alt=false, line=0.2, solid=!$preview)
    makepoly(ldraw_lib__s__87079s01(), step=step, col=col, unit=unit, alt=alt, line=line, solid=solid);
ldraw_lib__s__87079s01(line=0.2);
// file: ../p/box3u12.scad
use <../lib.scad>
function ldraw_lib__box3u12() = [
// 0 Box with 3 Parallel Faces without Any Edges
// 0 Name: box3u12.dat
// 0 Author: J.C. Tchang [tchang]
// 0 !LDRAW_ORG Primitive UPDATE 2014-02
// 0 !LICENSE Licensed under CC BY 2.0 and CC BY 4.0 : see CAreadme.txt
// 
// 0 BFC CERTIFY CCW
  [0,"BFC","CERTIFY"],
  [0,"BFC","CCW"],
// 
// 0 !HISTORY 2014-12-23 [PTadmin] Official Update 2014-02
// 
// 
// 4 16 -1 1 1 1 1 1 1 1 -1 -1 1 -1
  [4,16,-1,1,1,1,1,1,1,1,-1,-1,1,-1],
// 4 16 -1 1 1 -1 0 1 1 0 1 1 1 1
  [4,16,-1,1,1,-1,0,1,1,0,1,1,1,1],
// 4 16 1 1 -1 1 0 -1 -1 0 -1 -1 1 -1
  [4,16,1,1,-1,1,0,-1,-1,0,-1,-1,1,-1],
];
makepoly(ldraw_lib__box3u12(), line=0.2);
// file: ../p/1-4cyli.scad
use <../lib.scad>
function ldraw_lib__1_4cyli() = [
// 0 Cylinder 0.25
// 0 Name: 1-4cyli.dat
// 0 Author: James Jessiman
// 0 !LDRAW_ORG Primitive UPDATE 2012-01
// 0 !LICENSE Licensed under CC BY 2.0 and CC BY 4.0 : see CAreadme.txt
// 
// 0 BFC CERTIFY CCW
  [0,"BFC","CERTIFY"],
  [0,"BFC","CCW"],
// 
// 0 !HISTORY 2002-03-23 [sbliss] Added BFC statement.
// 0 !HISTORY 2002-04-25 [PTadmin] Official Update 2002-02
// 0 !HISTORY 2007-06-22 [PTadmin] Header formatted for Contributor Agreement
// 0 !HISTORY 2008-07-01 [PTadmin] Official Update 2008-01
// 0 !HISTORY 2012-02-16 [Philo] Changed to CCW
// 0 !HISTORY 2012-03-30 [PTadmin] Official Update 2012-01
// 
// 
// 4 16 1 1 0 0.9239 1 0.3827 0.9239 0 0.3827 1 0 0
  [4,16,1,1,0,0.9239,1,0.3827,0.9239,0,0.3827,1,0,0],
// 5 24 1 0 0 1 1 0 0.9239 0 0.3827 1 0 -1
  [5,24,1,0,0,1,1,0,0.9239,0,0.3827,1,0,-1],
// 4 16 0.9239 1 0.3827 0.7071 1 0.7071 0.7071 0 0.7071 0.9239 0 0.3827
  [4,16,0.9239,1,0.3827,0.7071,1,0.7071,0.7071,0,0.7071,0.9239,0,0.3827],
// 5 24 0.9239 0 0.3827 0.9239 1 0.3827 0.7071 0 0.7071 1 0 0
  [5,24,0.9239,0,0.3827,0.9239,1,0.3827,0.7071,0,0.7071,1,0,0],
// 4 16 0.7071 1 0.7071 0.3827 1 0.9239 0.3827 0 0.9239 0.7071 0 0.7071
  [4,16,0.7071,1,0.7071,0.3827,1,0.9239,0.3827,0,0.9239,0.7071,0,0.7071],
// 5 24 0.7071 0 0.7071 0.7071 1 0.7071 0.3827 0 0.9239 0.9239 0 0.3827
  [5,24,0.7071,0,0.7071,0.7071,1,0.7071,0.3827,0,0.9239,0.9239,0,0.3827],
// 4 16 0.3827 1 0.9239 0 1 1 0 0 1 0.3827 0 0.9239
  [4,16,0.3827,1,0.9239,0,1,1,0,0,1,0.3827,0,0.9239],
// 5 24 0.3827 0 0.9239 0.3827 1 0.9239 0 0 1 0.7071 0 0.7071
  [5,24,0.3827,0,0.9239,0.3827,1,0.9239,0,0,1,0.7071,0,0.7071],
// 5 24 0 0 1 0 1 1 0.3827 0 0.9239 -1 0 1
  [5,24,0,0,1,0,1,1,0.3827,0,0.9239,-1,0,1],
];
module ldraw_lib__1_4cyli(step=0, col=false, unit=2/5, alt=false, line=0.2, solid=!$preview)
    makepoly(ldraw_lib__1_4cyli(), step=step, col=col, unit=unit, alt=alt, line=line, solid=solid);
ldraw_lib__1_4cyli(line=0.2);
// file: ../p/1-4chrd.scad
use <../lib.scad>
$fa=1; $fs=0.2;
function ldraw_lib__1_4chrd(realsolid=false) = [
// 0 Chord 0.25
// 0 Name: 1-4chrd.dat
// 0 Author: Tony Hafner [hafhead]
// 0 !LDRAW_ORG Primitive UPDATE 2012-02
// 0 !LICENSE Licensed under CC BY 2.0 and CC BY 4.0 : see CAreadme.txt
// 
// 0 BFC CERTIFY CCW
  [0,"BFC","CERTIFY"],
  [0,"BFC","CCW"],
// 
// 0 !HISTORY 2004-04-22 [PTadmin] Official Update 2004-02
// 0 !HISTORY 2007-10-09 [PTadmin] Header formatted for Contributor Agreement
// 0 !HISTORY 2008-07-01 [PTadmin] Official Update 2008-01
// 0 !HISTORY 2012-08-02 [MMR1988] Re-creation with PrimGen2 and Rectifier
// 0 !HISTORY 2012-08-09 [PTadmin] Official Update 2012-02
// 
// 
// 4 16 0.9239 0 0.3827 0.3827 0 0.9239 0 0 1 1 0 0
  [4,16,0.9239,0,0.3827,0.3827,0,0.9239,0,0,1,1,0,0],
// 3 16 0.7071 0 0.7071 0.3827 0 0.9239 0.9239 0 0.3827
  [3,16,0.7071,0,0.7071,0.3827,0,0.9239,0.9239,0,0.3827],
];
module ldraw_lib__1_4chrd(step=0, col=false, unit=2/5, alt=false, line=0.2, solid=!$preview)
    makepoly(ldraw_lib__1_4chrd(solid), step=step, col=col, unit=unit, alt=alt, line=line, solid=solid);
ldraw_lib__1_4chrd(line=0.2);
// file: 87079.scad
use <../lib.scad>
use <s/87079s01.scad>
function ldraw_lib__87079() = [
// 0 Tile  2 x  4 with Groove
// 0 Name: 87079.dat
// 0 Author: Tim Gould [timgould]
// 0 !LDRAW_ORG Part UPDATE 2012-03
// 0 !LICENSE Licensed under CC BY 4.0 : see CAreadme.txt
// 
// 0 BFC CERTIFY CCW
  [0,"BFC","CERTIFY"],
  [0,"BFC","CCW"],
// 
// 0 !HISTORY 2010-04-05 [PTadmin] Official Update 2010-01
// 0 !HISTORY 2012-09-30 [Philo] Subparted for patterns
// 0 !HISTORY 2012-12-28 [PTadmin] Official Update 2012-03
// 
// 
// 4 16 -40 0 -20 40 0 -20 40 0 20 -40 0 20
  [4,16,-40,0,-20,40,0,-20,40,0,20,-40,0,20],
// 1 16 0 0 0 1 0 0 0 1 0 0 0 1 s\87079s01.dat
  [1,16,0,0,0,1,0,0,0,1,0,0,0,1, ldraw_lib__s__87079s01()],
];
module ldraw_lib__87079(step=0, col=false, unit=2/5, alt=false, line=0.2, solid=!$preview)
    makepoly(ldraw_lib__87079(), step=step, col=col, unit=unit, alt=alt, line=line, solid=solid);
ldraw_lib__87079(line=0.2);
// main file
use <../lib.scad>
use <6141955c.scad>
use <87079.scad>
function ldraw_lib__87079d1q() = [
// 0 Tile  2 x  4 with White Stripe and Black and White Arcs on Blue Background Sticker
// 0 Name: 87079d1q.dat
// 0 Author: Alfred Schmitz [AlfredS]
// 0 !LDRAW_ORG Shortcut UPDATE 2026-09
// 0 !LICENSE Licensed under CC BY 4.0 : see CAreadme.txt
// 
// 0 BFC CERTIFY CCW
  [0,"BFC","CERTIFY"],
  [0,"BFC","CCW"],
// 
// 0 !CATEGORY Sticker Shortcut
// 0 !KEYWORDS Ford, GT, Mustang, Set 75871, Speed Champions
// 
// 0 !HISTORY 2026-09-30 [OrionP] Official Update 2026-09
// 
// 1 16 0 0 0 1 0 0 0 1 0 0 0 1 87079.dat
  [1,16,0,0,0,1,0,0,0,1,0,0,0,1, ldraw_lib__87079()],
// 1 16 0 0 0 1 0 0 0 1 0 0 0 1 6141955c.dat
  [1,16,0,0,0,1,0,0,0,1,0,0,0,1, ldraw_lib__6141955c()],
];
module ldraw_lib__87079d1q(step=0, col=false, unit=2/5, alt=false, line=0.2, solid=!$preview)
    makepoly(ldraw_lib__87079d1q(), step=step, col=col, unit=unit, alt=alt, line=line, solid=solid);
ldraw_lib__87079d1q(line=0.2);
